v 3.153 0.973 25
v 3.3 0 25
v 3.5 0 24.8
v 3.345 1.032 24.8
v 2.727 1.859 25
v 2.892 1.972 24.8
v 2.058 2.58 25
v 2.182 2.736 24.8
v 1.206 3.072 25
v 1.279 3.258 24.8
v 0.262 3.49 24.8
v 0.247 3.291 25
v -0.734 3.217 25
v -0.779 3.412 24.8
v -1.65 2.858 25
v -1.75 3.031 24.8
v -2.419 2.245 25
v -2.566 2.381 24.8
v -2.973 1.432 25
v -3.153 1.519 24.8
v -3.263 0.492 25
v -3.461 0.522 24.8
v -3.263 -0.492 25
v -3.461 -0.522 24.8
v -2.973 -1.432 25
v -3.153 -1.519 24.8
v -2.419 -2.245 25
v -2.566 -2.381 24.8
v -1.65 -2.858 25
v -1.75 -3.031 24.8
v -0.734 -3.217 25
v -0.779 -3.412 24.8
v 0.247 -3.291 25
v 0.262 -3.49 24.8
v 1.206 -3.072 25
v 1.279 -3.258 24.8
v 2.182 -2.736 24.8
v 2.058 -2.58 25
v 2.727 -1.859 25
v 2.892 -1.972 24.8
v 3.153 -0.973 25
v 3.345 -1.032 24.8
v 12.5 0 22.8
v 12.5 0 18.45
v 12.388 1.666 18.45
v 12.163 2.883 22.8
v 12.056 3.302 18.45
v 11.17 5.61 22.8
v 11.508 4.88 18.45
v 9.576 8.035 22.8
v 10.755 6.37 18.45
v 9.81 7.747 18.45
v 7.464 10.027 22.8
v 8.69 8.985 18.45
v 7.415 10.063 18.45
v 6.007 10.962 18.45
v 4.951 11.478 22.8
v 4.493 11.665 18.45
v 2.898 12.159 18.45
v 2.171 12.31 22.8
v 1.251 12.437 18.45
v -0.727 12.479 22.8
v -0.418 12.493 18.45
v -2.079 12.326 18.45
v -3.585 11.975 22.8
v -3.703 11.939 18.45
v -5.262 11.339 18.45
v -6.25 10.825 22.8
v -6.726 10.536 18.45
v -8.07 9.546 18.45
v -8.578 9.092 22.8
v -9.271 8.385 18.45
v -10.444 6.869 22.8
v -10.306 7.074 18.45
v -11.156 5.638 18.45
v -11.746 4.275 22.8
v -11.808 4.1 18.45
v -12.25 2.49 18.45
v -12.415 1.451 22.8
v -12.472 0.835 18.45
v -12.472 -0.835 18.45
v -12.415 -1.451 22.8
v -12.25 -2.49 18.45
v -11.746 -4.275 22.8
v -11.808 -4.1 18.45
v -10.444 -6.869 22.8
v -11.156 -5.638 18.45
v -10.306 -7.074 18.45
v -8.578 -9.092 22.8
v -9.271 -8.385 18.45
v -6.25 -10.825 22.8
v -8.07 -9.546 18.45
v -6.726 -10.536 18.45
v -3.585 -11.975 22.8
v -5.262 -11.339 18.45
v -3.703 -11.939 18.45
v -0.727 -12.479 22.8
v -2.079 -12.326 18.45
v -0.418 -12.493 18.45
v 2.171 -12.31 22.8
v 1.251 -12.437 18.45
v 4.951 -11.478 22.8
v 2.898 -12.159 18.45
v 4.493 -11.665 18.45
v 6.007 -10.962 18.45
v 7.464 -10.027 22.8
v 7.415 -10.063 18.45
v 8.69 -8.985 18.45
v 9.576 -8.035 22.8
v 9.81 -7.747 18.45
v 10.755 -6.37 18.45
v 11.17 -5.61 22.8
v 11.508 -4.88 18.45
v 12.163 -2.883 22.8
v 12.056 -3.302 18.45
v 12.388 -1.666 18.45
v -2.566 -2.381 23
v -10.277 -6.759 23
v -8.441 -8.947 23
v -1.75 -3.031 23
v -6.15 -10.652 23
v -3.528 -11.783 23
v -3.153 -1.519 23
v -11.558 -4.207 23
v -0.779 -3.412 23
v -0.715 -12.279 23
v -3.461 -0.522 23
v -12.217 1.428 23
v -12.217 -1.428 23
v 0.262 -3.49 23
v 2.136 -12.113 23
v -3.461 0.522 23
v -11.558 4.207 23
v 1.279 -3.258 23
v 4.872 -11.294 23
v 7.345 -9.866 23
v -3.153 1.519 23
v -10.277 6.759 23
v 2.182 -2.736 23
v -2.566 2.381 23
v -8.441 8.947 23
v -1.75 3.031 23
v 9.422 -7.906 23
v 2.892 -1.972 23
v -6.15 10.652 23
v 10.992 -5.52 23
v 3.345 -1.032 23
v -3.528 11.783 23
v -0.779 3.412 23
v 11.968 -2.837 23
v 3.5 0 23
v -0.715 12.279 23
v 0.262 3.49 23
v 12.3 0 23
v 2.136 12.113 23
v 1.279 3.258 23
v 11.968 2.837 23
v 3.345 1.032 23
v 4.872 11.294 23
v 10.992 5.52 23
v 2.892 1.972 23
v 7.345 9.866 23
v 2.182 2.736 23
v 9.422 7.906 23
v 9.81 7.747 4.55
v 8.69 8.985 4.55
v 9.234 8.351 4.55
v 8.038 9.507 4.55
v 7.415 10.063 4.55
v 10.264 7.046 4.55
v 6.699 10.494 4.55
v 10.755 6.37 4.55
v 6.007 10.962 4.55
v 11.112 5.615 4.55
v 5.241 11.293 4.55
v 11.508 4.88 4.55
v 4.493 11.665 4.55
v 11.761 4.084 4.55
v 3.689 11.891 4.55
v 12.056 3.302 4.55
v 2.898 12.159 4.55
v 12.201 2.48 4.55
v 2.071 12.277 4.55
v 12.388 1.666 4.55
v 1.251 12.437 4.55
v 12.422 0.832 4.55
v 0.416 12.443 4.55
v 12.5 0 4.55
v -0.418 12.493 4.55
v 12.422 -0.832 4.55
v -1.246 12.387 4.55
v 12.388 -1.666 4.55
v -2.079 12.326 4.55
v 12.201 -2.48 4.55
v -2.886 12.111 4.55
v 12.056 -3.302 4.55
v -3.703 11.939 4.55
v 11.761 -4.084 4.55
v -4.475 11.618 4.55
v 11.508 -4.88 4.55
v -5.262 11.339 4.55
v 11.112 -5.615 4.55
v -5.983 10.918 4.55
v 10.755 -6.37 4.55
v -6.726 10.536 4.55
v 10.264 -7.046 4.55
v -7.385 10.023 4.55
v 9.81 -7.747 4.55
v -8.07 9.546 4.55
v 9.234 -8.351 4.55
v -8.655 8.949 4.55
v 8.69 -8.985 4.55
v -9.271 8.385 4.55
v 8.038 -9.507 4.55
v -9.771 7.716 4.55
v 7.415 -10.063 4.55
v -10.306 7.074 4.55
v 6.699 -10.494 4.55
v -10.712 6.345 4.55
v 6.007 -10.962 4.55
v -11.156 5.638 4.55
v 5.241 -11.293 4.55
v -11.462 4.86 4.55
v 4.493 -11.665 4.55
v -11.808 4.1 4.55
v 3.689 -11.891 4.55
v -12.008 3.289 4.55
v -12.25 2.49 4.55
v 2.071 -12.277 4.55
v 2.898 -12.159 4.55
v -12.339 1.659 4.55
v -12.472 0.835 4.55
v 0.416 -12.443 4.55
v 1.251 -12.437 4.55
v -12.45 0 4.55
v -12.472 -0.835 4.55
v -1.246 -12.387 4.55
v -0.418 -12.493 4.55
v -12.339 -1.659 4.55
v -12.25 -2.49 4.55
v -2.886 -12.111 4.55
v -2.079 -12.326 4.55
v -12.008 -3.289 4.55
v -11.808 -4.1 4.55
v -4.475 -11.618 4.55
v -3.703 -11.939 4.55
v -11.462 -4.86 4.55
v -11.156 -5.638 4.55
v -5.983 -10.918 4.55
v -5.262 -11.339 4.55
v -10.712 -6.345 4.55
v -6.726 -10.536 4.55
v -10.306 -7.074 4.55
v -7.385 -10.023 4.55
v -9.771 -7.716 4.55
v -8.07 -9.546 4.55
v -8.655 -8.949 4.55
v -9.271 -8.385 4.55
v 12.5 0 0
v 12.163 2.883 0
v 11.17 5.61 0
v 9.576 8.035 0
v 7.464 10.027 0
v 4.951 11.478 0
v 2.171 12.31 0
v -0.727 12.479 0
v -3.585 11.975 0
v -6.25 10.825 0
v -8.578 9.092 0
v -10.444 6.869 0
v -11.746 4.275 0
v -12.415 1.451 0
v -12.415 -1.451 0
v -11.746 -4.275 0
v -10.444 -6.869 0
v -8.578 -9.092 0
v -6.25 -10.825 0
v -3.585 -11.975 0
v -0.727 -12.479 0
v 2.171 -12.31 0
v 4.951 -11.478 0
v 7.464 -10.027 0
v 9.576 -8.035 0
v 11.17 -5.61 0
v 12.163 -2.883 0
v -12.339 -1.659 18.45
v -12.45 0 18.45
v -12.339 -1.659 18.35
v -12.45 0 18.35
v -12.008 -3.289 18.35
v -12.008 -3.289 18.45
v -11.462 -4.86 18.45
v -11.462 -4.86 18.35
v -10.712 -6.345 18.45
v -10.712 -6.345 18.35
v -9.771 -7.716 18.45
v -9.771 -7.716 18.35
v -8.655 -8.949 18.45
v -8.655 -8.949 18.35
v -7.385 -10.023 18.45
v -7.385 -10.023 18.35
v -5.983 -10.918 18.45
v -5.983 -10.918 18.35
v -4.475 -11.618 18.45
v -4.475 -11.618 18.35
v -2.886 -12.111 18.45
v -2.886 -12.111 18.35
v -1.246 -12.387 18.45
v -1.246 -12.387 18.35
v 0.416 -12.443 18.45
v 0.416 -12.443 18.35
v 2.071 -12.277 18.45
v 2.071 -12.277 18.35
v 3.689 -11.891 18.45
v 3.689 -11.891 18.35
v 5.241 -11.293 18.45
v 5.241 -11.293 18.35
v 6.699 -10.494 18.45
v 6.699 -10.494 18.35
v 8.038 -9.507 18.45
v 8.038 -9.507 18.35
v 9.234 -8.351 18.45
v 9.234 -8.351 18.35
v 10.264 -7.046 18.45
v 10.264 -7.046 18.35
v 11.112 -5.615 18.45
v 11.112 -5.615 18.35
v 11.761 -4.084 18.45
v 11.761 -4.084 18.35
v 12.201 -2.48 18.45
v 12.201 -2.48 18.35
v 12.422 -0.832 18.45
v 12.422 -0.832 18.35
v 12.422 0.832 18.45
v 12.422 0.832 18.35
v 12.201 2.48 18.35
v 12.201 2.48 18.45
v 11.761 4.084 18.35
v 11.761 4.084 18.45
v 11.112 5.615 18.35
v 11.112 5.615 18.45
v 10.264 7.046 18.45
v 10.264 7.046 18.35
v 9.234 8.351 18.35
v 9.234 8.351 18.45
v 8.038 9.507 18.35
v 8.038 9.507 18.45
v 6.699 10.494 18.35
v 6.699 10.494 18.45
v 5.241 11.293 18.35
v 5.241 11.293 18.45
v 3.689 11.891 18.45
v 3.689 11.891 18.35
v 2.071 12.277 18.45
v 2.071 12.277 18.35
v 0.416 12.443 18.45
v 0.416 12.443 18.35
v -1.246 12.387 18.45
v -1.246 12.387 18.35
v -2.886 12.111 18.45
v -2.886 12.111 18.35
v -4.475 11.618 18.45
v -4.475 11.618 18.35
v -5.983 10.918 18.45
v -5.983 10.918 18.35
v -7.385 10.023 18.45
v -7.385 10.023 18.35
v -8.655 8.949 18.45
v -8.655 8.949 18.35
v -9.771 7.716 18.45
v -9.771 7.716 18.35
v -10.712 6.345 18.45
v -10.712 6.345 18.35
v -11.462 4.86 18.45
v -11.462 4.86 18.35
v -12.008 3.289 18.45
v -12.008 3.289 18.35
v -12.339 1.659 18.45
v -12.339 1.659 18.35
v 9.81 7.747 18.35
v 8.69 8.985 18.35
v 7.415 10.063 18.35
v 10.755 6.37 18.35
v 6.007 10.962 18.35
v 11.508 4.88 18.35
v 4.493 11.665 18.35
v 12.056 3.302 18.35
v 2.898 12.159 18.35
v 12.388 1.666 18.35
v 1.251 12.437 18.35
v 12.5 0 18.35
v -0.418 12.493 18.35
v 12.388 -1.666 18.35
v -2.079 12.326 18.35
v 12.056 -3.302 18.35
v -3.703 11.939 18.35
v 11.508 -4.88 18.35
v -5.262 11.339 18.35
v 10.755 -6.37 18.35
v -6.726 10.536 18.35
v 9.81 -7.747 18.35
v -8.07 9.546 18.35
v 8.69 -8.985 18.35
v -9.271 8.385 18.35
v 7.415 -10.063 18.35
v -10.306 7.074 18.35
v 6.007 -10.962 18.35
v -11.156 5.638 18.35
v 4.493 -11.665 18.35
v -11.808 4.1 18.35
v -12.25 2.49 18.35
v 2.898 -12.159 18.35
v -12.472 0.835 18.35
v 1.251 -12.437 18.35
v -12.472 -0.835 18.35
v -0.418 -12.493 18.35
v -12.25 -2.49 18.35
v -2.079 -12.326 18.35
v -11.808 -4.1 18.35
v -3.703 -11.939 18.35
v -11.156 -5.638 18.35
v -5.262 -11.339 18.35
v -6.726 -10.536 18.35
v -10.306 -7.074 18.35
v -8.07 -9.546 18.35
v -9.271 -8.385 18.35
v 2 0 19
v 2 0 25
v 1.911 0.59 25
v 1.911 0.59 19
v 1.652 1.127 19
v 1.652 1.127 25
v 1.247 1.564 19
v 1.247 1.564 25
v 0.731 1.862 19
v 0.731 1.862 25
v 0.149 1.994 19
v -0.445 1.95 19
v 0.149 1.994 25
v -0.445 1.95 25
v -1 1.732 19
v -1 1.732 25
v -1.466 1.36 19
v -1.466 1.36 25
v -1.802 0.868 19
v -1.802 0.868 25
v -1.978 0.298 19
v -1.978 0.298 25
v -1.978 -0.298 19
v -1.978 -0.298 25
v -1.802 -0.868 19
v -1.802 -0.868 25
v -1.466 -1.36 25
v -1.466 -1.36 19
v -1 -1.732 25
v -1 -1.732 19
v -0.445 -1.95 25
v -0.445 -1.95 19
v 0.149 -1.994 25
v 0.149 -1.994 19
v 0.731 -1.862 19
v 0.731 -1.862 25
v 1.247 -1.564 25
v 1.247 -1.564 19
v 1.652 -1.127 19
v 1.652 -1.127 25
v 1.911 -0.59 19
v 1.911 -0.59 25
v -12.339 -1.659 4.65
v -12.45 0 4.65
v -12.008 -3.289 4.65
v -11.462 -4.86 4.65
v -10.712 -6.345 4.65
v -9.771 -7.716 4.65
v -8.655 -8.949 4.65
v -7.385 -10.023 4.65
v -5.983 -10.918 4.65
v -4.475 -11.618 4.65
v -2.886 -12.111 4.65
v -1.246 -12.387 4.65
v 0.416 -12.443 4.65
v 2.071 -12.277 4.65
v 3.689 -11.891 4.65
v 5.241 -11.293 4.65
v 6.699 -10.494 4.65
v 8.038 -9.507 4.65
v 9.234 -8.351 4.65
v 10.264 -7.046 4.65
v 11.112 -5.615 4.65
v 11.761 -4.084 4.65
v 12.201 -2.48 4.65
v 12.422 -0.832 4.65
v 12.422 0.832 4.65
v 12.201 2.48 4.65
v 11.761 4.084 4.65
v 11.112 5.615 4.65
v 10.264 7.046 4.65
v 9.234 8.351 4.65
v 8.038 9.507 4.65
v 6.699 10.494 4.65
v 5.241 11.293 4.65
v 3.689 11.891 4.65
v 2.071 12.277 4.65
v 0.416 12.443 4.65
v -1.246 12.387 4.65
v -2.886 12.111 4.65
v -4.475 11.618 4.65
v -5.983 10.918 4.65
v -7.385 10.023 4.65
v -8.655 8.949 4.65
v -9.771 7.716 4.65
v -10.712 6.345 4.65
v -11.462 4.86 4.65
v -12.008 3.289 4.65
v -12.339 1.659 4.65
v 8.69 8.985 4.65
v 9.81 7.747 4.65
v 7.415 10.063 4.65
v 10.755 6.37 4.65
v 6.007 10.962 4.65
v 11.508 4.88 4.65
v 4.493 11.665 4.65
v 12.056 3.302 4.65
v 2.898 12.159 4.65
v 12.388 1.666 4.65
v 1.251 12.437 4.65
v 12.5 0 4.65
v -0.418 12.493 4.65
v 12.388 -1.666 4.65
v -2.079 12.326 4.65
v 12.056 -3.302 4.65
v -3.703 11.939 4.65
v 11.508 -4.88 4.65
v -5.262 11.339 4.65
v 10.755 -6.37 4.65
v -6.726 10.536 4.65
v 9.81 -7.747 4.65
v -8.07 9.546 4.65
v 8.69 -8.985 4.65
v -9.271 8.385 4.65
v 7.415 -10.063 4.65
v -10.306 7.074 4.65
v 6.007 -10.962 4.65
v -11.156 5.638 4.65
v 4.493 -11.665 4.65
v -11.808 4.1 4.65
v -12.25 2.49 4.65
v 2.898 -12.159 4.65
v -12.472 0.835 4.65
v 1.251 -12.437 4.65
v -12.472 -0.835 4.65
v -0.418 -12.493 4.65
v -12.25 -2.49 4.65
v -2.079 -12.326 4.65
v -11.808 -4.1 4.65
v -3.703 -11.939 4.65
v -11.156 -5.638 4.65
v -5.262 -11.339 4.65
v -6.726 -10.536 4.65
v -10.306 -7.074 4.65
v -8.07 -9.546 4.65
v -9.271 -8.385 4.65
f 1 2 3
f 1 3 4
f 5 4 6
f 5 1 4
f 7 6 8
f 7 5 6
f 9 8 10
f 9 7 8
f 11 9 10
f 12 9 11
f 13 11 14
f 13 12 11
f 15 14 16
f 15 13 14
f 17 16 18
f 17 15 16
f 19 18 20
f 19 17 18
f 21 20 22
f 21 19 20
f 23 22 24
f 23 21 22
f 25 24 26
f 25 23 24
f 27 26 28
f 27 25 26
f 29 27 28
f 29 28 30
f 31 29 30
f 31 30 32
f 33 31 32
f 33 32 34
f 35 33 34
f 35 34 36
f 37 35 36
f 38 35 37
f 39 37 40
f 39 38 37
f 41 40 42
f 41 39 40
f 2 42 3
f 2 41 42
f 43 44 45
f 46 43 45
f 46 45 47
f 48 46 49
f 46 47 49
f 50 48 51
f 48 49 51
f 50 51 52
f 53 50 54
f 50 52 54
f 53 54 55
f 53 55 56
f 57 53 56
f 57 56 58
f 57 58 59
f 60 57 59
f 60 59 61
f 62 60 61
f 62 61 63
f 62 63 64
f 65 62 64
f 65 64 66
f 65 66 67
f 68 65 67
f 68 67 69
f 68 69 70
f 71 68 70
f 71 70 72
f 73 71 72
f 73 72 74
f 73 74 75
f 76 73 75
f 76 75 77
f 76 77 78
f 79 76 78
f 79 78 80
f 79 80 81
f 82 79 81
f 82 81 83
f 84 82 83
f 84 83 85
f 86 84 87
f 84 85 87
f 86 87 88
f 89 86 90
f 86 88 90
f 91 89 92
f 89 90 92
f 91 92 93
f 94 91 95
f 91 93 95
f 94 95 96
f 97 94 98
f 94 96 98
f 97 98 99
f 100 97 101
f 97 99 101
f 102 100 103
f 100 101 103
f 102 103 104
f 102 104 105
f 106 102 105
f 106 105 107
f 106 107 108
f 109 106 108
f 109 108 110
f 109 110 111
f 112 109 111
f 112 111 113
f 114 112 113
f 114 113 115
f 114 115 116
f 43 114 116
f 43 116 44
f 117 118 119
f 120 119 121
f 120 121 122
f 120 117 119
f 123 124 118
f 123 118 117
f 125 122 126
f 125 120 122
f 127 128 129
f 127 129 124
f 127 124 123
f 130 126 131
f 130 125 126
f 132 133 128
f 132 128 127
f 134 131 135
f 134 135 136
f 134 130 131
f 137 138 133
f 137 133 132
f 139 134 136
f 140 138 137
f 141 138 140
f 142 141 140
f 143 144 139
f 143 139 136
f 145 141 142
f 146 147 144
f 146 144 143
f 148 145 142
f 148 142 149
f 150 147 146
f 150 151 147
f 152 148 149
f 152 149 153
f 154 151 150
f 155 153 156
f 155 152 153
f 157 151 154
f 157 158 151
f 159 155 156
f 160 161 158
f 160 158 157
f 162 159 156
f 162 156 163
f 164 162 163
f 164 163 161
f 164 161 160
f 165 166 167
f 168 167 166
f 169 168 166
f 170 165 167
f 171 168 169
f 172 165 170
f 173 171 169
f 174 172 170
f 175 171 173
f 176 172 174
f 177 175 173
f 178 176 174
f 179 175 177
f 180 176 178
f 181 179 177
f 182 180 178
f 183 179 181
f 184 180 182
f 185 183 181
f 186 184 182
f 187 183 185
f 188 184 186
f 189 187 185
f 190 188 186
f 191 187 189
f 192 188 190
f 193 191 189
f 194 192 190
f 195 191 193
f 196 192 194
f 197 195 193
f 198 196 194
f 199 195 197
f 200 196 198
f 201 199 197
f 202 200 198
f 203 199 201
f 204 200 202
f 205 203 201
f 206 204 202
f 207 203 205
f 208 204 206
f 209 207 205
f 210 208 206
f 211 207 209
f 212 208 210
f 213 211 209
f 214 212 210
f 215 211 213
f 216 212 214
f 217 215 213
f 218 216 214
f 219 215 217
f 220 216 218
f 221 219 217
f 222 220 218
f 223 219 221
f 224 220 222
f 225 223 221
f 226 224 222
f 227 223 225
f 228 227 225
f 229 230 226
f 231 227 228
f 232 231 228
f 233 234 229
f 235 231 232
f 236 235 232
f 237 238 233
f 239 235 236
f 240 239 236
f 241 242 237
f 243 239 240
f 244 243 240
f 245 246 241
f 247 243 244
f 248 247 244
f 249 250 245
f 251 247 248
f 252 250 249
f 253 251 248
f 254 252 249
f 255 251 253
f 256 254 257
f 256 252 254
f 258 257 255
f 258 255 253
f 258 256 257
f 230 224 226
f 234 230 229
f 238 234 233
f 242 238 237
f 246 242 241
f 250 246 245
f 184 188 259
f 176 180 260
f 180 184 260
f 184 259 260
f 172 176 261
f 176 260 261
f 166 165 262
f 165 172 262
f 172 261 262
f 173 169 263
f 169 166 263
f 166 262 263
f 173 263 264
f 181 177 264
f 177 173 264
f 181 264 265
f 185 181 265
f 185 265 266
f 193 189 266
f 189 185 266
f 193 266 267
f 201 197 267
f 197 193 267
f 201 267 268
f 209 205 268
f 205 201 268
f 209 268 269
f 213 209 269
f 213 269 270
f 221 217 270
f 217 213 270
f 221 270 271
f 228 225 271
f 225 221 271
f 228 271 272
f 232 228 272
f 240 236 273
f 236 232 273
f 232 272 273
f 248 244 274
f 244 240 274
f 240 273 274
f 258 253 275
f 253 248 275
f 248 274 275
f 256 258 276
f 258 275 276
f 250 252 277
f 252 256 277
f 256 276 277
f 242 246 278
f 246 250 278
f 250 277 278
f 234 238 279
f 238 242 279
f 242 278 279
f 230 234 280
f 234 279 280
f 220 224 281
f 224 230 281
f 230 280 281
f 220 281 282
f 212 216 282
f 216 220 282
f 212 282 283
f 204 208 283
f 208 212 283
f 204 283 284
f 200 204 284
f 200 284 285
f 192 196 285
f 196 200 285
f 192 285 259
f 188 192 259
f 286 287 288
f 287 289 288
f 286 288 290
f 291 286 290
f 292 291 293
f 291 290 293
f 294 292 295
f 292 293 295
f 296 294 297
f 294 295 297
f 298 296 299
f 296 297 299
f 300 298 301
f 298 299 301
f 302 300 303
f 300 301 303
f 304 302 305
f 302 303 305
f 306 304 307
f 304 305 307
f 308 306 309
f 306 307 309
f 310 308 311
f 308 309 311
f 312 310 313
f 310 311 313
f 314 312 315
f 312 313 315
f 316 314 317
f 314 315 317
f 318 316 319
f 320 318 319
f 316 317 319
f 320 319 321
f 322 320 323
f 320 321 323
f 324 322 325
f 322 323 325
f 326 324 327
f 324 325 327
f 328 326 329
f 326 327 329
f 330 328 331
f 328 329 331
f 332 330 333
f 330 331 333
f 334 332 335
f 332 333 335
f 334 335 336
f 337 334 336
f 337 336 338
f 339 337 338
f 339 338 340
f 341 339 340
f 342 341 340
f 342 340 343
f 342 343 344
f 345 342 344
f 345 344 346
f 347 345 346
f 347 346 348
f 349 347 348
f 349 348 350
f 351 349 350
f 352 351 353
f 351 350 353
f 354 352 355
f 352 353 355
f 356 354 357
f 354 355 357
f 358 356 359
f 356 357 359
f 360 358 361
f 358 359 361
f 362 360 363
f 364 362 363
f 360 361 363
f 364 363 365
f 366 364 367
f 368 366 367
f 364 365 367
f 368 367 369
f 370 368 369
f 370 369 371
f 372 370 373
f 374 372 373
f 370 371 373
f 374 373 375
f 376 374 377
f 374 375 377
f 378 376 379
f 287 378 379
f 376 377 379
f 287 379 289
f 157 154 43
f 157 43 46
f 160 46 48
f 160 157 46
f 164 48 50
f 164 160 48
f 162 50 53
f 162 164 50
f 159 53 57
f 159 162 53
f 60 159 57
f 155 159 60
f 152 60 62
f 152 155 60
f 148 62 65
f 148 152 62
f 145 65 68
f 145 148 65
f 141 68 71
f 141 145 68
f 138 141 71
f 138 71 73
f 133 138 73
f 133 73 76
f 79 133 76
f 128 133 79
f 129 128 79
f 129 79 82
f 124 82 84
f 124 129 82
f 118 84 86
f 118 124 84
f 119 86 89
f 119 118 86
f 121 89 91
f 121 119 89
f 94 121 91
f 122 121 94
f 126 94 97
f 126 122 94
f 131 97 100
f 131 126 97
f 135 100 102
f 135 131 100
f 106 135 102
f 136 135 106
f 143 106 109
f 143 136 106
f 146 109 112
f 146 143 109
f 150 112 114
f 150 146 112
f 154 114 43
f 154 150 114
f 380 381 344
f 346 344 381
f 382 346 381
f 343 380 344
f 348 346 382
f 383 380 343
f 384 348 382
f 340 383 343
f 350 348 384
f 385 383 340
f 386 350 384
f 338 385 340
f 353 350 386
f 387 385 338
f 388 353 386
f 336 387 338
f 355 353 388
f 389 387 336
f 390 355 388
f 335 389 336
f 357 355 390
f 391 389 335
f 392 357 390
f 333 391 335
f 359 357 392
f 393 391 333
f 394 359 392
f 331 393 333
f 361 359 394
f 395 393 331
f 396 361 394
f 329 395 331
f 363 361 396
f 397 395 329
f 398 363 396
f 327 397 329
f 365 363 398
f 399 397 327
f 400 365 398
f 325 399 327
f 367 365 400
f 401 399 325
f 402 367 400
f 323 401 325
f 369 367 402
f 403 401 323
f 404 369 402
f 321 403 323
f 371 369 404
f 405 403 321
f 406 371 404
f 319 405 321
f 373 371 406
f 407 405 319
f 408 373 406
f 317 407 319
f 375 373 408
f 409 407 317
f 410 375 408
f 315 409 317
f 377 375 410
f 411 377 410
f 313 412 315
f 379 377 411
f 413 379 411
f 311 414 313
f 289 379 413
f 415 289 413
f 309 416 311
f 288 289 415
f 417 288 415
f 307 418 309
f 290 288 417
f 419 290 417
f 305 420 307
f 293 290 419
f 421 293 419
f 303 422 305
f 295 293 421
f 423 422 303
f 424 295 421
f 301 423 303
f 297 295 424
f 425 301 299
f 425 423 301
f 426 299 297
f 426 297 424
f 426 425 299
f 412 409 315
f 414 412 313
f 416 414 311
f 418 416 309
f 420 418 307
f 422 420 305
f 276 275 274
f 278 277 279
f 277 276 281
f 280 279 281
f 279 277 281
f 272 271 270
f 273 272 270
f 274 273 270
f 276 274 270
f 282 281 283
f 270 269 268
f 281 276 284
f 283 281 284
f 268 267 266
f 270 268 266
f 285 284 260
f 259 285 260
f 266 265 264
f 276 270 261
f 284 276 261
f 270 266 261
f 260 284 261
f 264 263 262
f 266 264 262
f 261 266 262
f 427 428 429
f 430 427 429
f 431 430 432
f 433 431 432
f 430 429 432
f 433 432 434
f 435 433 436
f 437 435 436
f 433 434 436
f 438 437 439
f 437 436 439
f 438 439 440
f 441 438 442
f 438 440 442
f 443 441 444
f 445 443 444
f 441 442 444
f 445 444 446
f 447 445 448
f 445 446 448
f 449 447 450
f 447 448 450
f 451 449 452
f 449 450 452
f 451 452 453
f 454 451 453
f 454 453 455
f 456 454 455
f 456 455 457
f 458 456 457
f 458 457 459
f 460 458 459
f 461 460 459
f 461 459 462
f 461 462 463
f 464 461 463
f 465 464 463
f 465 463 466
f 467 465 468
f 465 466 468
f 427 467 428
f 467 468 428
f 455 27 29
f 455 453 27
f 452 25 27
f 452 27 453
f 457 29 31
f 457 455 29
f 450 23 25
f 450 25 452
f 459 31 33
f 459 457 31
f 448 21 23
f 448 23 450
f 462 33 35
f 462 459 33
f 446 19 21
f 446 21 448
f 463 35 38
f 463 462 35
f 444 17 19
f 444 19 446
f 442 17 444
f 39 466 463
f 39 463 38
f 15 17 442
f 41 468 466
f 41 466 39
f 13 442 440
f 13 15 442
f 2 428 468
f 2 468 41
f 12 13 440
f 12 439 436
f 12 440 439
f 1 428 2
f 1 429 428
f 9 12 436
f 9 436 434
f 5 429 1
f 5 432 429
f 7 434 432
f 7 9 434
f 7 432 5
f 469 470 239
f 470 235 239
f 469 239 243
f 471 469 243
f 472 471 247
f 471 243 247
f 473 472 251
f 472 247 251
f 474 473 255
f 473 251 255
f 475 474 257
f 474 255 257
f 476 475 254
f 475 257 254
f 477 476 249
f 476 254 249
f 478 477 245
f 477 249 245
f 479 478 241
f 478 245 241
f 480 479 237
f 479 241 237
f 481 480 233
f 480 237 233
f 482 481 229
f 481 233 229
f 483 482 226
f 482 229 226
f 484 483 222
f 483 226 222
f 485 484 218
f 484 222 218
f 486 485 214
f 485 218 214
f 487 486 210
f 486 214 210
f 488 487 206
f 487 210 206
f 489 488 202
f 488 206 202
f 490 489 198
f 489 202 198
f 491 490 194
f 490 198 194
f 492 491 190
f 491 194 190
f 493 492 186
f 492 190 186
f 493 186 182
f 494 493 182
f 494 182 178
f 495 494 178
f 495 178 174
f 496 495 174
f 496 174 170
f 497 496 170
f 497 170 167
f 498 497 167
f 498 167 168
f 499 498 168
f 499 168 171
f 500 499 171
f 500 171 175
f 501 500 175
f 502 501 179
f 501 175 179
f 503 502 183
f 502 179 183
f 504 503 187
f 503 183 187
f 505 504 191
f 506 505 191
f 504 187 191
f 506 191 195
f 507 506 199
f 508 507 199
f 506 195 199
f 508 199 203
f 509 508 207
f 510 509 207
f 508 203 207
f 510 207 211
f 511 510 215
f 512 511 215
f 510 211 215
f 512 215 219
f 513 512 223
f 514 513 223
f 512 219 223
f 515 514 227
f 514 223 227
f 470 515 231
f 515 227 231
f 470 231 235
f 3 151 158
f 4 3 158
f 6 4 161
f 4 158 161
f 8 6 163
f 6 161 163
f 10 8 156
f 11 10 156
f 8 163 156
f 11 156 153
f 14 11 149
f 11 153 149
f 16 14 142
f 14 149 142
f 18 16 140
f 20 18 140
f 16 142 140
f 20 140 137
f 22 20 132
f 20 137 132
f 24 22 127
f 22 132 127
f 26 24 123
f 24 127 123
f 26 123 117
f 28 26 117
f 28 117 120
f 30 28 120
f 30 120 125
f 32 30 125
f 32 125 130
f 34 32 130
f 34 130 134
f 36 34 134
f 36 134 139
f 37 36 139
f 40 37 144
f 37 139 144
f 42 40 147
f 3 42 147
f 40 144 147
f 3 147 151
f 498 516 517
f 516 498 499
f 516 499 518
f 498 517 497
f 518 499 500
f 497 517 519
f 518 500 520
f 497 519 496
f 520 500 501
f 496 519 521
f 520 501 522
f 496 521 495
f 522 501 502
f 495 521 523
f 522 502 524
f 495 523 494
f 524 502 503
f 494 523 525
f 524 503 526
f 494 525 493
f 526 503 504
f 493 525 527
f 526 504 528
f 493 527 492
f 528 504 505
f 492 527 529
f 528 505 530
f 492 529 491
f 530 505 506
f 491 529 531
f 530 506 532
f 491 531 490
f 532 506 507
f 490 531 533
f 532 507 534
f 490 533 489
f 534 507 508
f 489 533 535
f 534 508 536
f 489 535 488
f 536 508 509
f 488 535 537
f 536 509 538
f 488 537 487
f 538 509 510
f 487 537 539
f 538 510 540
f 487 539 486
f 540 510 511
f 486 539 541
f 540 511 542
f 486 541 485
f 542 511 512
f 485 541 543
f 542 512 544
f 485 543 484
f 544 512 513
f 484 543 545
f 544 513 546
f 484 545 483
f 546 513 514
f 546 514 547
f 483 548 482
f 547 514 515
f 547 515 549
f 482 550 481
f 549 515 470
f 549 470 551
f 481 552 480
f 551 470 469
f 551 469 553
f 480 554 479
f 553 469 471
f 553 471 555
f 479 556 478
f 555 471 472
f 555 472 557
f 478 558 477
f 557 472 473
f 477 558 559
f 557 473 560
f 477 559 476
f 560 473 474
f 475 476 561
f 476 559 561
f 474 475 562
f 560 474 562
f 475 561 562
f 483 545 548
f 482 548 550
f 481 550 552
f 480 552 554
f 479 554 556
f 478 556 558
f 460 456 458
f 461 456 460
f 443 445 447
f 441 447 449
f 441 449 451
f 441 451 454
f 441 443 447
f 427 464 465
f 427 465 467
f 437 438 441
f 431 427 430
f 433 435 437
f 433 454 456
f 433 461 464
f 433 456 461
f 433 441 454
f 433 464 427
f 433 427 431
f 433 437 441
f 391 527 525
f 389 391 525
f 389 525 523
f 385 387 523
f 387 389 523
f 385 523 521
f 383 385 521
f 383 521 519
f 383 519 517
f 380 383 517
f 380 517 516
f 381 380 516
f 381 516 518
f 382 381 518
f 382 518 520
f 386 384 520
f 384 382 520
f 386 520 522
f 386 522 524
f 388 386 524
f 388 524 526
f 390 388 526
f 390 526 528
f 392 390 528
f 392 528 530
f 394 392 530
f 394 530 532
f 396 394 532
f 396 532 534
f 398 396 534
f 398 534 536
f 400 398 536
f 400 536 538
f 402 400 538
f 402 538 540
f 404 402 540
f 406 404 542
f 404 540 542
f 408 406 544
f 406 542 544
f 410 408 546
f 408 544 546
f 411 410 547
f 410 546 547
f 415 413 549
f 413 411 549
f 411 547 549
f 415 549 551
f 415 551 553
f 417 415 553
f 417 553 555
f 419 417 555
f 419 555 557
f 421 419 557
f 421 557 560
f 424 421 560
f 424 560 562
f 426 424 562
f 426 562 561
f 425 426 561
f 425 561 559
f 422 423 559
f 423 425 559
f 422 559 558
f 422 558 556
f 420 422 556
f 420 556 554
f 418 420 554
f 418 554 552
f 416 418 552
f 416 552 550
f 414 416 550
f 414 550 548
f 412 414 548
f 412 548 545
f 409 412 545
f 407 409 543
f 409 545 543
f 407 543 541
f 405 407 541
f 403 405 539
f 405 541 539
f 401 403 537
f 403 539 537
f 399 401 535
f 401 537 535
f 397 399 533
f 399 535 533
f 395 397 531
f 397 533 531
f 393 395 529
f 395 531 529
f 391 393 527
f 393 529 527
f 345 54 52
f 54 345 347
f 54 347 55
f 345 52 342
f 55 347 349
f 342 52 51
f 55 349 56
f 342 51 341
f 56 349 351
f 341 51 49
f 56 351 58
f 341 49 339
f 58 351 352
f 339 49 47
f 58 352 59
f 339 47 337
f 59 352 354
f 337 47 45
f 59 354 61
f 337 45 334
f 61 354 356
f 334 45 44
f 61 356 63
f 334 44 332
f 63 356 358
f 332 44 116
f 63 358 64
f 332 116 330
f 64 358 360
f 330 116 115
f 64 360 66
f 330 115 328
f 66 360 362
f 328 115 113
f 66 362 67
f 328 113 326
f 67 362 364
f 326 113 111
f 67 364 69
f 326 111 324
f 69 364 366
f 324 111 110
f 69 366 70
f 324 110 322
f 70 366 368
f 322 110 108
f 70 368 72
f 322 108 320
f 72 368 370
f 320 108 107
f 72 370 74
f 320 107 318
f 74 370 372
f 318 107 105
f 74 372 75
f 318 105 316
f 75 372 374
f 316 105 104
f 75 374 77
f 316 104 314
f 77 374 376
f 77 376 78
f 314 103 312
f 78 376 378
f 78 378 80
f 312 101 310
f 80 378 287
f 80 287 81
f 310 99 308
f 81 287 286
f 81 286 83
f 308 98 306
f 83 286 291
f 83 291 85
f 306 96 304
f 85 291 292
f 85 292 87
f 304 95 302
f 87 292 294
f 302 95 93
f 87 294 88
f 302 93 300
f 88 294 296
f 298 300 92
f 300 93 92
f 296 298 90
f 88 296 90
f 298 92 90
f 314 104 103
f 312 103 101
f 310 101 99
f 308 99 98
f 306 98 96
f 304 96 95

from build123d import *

# Parameters (mm, degrees)
CROQUIS1_R              = 12.5
SALIENTE_EXTRUIR1_DEPTH = 23
CROQUIS2_R              = 3.5
SALIENTE_EXTRUIR2_DEPTH = 2
CROQUIS3_R              = 2
CORTAR_EXTRUIR2_DEPTH   = 6
CHAFL_N2_SIZE           = 0.2
CROQUIS4_W              = 0.1
CROQUIS4_H              = 0.1
CHAFL_N3_SIZE           = 0.2


with BuildPart() as part:
    # Croquis1 → Saliente-Extruir1 (new body)
    with BuildSketch(Plane.XY):
        Circle(CROQUIS1_R)
    extrude(amount=SALIENTE_EXTRUIR1_DEPTH)

    # Croquis2 → Saliente-Extruir2 (add)
    with BuildSketch(Plane.XY.offset(23)):
        Circle(CROQUIS2_R)
    extrude(amount=SALIENTE_EXTRUIR2_DEPTH)

    # Croquis3 → Cortar-Extruir2 (cut)
    with BuildSketch(Plane.XY.offset(25)):
        Circle(CROQUIS3_R)
    extrude(amount=-CORTAR_EXTRUIR2_DEPTH, mode=Mode.SUBTRACT)

    # Chaflán2
    chafl_n2_edges = [part.edges().sort_by_distance(p)[0] for p in [
        (-12.5, 0, 23),
    ]]
    chamfer(chafl_n2_edges, length=CHAFL_N2_SIZE)

    # Croquis4 → Cortar-Revolución1 (revolve, cut)
    with BuildSketch(Plane(origin=(0, 0, 0), x_dir=(1, 0, 0), z_dir=(0, 1, 0))):
        with Locations((-12.5, -4.6)):
            Rectangle(CROQUIS4_W, CROQUIS4_H)
        with Locations((-12.5, -18.4)):
            Rectangle(CROQUIS4_W, CROQUIS4_H)
    revolve(axis=Axis((0, 0, 0), (0, 0, 1)), mode=Mode.SUBTRACT)

    # Chaflán3
    chafl_n3_edges = [part.edges().sort_by_distance(p)[0] for p in [
        (-3.5, 0, 25),
    ]]
    chamfer(chafl_n3_edges, length=CHAFL_N3_SIZE)


solid = part.part
